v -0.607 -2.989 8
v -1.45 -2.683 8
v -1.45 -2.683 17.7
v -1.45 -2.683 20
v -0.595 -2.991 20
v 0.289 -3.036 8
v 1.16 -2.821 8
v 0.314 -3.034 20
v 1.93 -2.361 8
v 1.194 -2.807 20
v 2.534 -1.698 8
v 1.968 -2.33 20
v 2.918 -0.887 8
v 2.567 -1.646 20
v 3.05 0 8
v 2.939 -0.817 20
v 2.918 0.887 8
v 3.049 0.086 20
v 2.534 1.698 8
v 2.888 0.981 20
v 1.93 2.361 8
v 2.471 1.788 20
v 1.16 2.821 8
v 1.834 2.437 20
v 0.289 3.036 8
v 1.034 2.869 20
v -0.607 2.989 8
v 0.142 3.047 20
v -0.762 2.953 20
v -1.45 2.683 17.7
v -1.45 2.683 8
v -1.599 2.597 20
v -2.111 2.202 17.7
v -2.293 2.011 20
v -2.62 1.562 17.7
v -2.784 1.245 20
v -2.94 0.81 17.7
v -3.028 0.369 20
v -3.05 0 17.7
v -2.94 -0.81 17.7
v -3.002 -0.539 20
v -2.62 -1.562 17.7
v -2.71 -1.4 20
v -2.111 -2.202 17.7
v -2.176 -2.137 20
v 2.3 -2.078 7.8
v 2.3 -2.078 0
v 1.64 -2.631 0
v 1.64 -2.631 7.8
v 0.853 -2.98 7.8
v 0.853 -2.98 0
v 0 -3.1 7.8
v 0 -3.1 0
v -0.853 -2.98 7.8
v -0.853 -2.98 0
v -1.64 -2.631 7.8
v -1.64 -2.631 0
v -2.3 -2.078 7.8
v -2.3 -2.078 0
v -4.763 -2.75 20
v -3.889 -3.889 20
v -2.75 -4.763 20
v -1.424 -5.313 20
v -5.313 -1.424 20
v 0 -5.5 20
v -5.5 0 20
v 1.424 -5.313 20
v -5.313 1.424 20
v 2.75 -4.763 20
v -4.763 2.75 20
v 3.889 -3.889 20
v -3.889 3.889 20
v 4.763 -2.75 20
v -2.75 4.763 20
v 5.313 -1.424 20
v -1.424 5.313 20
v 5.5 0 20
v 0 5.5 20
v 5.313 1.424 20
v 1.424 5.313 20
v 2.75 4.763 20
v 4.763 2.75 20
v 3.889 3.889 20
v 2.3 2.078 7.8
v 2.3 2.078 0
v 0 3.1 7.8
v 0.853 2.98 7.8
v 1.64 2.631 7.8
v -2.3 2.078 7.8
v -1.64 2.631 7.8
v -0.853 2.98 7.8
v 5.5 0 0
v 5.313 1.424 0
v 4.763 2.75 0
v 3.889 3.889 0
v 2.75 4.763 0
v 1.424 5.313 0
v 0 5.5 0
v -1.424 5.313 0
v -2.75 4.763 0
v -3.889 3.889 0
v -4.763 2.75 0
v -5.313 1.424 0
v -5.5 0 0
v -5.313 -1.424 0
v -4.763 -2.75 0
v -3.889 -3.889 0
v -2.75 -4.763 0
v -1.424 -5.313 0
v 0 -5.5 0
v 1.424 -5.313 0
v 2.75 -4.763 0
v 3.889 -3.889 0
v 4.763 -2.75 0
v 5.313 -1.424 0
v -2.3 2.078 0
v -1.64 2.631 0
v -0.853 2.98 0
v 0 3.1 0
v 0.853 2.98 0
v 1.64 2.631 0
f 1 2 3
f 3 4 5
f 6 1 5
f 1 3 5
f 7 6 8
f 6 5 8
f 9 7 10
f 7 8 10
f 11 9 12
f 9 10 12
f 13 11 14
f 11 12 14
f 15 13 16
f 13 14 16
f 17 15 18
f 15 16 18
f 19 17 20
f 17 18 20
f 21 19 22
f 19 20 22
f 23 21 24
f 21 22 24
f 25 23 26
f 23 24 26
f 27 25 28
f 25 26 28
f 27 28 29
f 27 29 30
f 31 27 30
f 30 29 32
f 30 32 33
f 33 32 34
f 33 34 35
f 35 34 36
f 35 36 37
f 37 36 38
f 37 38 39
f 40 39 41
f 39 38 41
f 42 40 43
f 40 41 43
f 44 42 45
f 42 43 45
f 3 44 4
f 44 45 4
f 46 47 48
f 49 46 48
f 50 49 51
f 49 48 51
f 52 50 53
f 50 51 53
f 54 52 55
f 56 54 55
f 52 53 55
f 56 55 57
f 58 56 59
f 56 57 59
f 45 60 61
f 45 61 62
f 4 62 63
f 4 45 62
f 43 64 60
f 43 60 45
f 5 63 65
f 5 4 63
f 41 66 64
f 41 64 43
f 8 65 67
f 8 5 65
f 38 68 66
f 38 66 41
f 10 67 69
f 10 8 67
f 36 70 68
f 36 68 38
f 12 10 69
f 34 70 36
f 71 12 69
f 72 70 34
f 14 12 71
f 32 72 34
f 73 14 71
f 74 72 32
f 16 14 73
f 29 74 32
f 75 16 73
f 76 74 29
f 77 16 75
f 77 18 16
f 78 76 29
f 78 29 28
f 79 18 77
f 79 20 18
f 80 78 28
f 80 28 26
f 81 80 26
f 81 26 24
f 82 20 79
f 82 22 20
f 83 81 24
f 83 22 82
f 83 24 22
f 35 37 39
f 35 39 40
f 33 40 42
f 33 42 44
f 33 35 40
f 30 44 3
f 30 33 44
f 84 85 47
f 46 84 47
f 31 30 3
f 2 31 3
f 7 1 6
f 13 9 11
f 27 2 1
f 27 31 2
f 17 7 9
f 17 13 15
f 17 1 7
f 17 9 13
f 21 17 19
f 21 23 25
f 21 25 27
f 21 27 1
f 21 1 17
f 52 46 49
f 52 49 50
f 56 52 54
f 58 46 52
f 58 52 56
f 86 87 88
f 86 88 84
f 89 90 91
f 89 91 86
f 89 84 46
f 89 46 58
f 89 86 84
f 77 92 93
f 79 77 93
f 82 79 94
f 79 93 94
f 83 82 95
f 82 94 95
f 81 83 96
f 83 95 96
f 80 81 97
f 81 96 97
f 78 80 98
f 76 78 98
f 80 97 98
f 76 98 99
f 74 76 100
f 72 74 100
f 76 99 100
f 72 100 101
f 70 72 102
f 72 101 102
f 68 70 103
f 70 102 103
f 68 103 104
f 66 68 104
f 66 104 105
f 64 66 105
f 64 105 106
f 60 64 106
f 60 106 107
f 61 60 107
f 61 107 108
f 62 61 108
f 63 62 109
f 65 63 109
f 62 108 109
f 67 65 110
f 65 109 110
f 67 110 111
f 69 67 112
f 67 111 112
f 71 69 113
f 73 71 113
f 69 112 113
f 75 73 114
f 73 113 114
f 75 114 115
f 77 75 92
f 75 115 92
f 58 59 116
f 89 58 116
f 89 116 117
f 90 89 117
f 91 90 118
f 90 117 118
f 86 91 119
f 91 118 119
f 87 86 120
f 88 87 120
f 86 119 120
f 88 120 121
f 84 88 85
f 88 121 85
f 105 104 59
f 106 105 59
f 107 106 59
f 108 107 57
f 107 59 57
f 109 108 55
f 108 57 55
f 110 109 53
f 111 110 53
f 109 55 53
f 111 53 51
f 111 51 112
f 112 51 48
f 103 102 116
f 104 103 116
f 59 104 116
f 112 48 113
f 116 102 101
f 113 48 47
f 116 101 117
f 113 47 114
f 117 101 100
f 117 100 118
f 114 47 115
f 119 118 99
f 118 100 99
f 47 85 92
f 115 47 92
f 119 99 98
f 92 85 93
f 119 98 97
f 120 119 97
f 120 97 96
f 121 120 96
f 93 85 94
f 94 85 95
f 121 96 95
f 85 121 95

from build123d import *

# Parameters (mm, degrees)
SKETCH1_R           = 5.5
BOSS_EXTRUDE1_DEPTH = 20
CUT_EXTRUDE1_DEPTH  = 12
CUT_EXTRUDE2_DEPTH  = 7.8
SKETCH4_R           = 3.05
CUT_EXTRUDE3_DEPTH  = 2.3


with BuildPart() as part:
    # Sketch1 → Boss-Extrude1 (new body)
    with BuildSketch(Plane.XY):
        Circle(SKETCH1_R)
    extrude(amount=BOSS_EXTRUDE1_DEPTH)

    # Sketch2 → Cut-Extrude1 (cut)
    with BuildSketch(Plane.XY.offset(20)):
        with BuildLine():
            ThreePointArc((-1.45, -2.683281573), (3.05, 0), (-1.45, 2.683281573))
            Line((-1.45, 2.683281573), (-1.45, -2.683281573))
        make_face()
    extrude(amount=-CUT_EXTRUDE1_DEPTH, mode=Mode.SUBTRACT)

    # Sketch3 → Cut-Extrude2 (cut)
    with BuildSketch(Plane(origin=(0, 0, 0), x_dir=(-1, 0, 0), z_dir=(0, 0, -1))):
        with BuildLine():
            Line((2.3, -2.078460969), (2.3, 2.078460969))
            ThreePointArc((2.3, 2.078460969), (0, 3.1), (-2.3, 2.078460969))
            Line((-2.3, 2.078460969), (-2.3, -2.078460969))
            ThreePointArc((-2.3, -2.078460969), (0, -3.1), (2.3, -2.078460969))
        make_face()
    extrude(amount=-CUT_EXTRUDE2_DEPTH, mode=Mode.SUBTRACT)

    # Sketch4 → Cut-Extrude3 (cut)
    with BuildSketch(Plane.XY.offset(20)):
        Circle(SKETCH4_R)
    extrude(amount=-CUT_EXTRUDE3_DEPTH, mode=Mode.SUBTRACT)


solid = part.part
